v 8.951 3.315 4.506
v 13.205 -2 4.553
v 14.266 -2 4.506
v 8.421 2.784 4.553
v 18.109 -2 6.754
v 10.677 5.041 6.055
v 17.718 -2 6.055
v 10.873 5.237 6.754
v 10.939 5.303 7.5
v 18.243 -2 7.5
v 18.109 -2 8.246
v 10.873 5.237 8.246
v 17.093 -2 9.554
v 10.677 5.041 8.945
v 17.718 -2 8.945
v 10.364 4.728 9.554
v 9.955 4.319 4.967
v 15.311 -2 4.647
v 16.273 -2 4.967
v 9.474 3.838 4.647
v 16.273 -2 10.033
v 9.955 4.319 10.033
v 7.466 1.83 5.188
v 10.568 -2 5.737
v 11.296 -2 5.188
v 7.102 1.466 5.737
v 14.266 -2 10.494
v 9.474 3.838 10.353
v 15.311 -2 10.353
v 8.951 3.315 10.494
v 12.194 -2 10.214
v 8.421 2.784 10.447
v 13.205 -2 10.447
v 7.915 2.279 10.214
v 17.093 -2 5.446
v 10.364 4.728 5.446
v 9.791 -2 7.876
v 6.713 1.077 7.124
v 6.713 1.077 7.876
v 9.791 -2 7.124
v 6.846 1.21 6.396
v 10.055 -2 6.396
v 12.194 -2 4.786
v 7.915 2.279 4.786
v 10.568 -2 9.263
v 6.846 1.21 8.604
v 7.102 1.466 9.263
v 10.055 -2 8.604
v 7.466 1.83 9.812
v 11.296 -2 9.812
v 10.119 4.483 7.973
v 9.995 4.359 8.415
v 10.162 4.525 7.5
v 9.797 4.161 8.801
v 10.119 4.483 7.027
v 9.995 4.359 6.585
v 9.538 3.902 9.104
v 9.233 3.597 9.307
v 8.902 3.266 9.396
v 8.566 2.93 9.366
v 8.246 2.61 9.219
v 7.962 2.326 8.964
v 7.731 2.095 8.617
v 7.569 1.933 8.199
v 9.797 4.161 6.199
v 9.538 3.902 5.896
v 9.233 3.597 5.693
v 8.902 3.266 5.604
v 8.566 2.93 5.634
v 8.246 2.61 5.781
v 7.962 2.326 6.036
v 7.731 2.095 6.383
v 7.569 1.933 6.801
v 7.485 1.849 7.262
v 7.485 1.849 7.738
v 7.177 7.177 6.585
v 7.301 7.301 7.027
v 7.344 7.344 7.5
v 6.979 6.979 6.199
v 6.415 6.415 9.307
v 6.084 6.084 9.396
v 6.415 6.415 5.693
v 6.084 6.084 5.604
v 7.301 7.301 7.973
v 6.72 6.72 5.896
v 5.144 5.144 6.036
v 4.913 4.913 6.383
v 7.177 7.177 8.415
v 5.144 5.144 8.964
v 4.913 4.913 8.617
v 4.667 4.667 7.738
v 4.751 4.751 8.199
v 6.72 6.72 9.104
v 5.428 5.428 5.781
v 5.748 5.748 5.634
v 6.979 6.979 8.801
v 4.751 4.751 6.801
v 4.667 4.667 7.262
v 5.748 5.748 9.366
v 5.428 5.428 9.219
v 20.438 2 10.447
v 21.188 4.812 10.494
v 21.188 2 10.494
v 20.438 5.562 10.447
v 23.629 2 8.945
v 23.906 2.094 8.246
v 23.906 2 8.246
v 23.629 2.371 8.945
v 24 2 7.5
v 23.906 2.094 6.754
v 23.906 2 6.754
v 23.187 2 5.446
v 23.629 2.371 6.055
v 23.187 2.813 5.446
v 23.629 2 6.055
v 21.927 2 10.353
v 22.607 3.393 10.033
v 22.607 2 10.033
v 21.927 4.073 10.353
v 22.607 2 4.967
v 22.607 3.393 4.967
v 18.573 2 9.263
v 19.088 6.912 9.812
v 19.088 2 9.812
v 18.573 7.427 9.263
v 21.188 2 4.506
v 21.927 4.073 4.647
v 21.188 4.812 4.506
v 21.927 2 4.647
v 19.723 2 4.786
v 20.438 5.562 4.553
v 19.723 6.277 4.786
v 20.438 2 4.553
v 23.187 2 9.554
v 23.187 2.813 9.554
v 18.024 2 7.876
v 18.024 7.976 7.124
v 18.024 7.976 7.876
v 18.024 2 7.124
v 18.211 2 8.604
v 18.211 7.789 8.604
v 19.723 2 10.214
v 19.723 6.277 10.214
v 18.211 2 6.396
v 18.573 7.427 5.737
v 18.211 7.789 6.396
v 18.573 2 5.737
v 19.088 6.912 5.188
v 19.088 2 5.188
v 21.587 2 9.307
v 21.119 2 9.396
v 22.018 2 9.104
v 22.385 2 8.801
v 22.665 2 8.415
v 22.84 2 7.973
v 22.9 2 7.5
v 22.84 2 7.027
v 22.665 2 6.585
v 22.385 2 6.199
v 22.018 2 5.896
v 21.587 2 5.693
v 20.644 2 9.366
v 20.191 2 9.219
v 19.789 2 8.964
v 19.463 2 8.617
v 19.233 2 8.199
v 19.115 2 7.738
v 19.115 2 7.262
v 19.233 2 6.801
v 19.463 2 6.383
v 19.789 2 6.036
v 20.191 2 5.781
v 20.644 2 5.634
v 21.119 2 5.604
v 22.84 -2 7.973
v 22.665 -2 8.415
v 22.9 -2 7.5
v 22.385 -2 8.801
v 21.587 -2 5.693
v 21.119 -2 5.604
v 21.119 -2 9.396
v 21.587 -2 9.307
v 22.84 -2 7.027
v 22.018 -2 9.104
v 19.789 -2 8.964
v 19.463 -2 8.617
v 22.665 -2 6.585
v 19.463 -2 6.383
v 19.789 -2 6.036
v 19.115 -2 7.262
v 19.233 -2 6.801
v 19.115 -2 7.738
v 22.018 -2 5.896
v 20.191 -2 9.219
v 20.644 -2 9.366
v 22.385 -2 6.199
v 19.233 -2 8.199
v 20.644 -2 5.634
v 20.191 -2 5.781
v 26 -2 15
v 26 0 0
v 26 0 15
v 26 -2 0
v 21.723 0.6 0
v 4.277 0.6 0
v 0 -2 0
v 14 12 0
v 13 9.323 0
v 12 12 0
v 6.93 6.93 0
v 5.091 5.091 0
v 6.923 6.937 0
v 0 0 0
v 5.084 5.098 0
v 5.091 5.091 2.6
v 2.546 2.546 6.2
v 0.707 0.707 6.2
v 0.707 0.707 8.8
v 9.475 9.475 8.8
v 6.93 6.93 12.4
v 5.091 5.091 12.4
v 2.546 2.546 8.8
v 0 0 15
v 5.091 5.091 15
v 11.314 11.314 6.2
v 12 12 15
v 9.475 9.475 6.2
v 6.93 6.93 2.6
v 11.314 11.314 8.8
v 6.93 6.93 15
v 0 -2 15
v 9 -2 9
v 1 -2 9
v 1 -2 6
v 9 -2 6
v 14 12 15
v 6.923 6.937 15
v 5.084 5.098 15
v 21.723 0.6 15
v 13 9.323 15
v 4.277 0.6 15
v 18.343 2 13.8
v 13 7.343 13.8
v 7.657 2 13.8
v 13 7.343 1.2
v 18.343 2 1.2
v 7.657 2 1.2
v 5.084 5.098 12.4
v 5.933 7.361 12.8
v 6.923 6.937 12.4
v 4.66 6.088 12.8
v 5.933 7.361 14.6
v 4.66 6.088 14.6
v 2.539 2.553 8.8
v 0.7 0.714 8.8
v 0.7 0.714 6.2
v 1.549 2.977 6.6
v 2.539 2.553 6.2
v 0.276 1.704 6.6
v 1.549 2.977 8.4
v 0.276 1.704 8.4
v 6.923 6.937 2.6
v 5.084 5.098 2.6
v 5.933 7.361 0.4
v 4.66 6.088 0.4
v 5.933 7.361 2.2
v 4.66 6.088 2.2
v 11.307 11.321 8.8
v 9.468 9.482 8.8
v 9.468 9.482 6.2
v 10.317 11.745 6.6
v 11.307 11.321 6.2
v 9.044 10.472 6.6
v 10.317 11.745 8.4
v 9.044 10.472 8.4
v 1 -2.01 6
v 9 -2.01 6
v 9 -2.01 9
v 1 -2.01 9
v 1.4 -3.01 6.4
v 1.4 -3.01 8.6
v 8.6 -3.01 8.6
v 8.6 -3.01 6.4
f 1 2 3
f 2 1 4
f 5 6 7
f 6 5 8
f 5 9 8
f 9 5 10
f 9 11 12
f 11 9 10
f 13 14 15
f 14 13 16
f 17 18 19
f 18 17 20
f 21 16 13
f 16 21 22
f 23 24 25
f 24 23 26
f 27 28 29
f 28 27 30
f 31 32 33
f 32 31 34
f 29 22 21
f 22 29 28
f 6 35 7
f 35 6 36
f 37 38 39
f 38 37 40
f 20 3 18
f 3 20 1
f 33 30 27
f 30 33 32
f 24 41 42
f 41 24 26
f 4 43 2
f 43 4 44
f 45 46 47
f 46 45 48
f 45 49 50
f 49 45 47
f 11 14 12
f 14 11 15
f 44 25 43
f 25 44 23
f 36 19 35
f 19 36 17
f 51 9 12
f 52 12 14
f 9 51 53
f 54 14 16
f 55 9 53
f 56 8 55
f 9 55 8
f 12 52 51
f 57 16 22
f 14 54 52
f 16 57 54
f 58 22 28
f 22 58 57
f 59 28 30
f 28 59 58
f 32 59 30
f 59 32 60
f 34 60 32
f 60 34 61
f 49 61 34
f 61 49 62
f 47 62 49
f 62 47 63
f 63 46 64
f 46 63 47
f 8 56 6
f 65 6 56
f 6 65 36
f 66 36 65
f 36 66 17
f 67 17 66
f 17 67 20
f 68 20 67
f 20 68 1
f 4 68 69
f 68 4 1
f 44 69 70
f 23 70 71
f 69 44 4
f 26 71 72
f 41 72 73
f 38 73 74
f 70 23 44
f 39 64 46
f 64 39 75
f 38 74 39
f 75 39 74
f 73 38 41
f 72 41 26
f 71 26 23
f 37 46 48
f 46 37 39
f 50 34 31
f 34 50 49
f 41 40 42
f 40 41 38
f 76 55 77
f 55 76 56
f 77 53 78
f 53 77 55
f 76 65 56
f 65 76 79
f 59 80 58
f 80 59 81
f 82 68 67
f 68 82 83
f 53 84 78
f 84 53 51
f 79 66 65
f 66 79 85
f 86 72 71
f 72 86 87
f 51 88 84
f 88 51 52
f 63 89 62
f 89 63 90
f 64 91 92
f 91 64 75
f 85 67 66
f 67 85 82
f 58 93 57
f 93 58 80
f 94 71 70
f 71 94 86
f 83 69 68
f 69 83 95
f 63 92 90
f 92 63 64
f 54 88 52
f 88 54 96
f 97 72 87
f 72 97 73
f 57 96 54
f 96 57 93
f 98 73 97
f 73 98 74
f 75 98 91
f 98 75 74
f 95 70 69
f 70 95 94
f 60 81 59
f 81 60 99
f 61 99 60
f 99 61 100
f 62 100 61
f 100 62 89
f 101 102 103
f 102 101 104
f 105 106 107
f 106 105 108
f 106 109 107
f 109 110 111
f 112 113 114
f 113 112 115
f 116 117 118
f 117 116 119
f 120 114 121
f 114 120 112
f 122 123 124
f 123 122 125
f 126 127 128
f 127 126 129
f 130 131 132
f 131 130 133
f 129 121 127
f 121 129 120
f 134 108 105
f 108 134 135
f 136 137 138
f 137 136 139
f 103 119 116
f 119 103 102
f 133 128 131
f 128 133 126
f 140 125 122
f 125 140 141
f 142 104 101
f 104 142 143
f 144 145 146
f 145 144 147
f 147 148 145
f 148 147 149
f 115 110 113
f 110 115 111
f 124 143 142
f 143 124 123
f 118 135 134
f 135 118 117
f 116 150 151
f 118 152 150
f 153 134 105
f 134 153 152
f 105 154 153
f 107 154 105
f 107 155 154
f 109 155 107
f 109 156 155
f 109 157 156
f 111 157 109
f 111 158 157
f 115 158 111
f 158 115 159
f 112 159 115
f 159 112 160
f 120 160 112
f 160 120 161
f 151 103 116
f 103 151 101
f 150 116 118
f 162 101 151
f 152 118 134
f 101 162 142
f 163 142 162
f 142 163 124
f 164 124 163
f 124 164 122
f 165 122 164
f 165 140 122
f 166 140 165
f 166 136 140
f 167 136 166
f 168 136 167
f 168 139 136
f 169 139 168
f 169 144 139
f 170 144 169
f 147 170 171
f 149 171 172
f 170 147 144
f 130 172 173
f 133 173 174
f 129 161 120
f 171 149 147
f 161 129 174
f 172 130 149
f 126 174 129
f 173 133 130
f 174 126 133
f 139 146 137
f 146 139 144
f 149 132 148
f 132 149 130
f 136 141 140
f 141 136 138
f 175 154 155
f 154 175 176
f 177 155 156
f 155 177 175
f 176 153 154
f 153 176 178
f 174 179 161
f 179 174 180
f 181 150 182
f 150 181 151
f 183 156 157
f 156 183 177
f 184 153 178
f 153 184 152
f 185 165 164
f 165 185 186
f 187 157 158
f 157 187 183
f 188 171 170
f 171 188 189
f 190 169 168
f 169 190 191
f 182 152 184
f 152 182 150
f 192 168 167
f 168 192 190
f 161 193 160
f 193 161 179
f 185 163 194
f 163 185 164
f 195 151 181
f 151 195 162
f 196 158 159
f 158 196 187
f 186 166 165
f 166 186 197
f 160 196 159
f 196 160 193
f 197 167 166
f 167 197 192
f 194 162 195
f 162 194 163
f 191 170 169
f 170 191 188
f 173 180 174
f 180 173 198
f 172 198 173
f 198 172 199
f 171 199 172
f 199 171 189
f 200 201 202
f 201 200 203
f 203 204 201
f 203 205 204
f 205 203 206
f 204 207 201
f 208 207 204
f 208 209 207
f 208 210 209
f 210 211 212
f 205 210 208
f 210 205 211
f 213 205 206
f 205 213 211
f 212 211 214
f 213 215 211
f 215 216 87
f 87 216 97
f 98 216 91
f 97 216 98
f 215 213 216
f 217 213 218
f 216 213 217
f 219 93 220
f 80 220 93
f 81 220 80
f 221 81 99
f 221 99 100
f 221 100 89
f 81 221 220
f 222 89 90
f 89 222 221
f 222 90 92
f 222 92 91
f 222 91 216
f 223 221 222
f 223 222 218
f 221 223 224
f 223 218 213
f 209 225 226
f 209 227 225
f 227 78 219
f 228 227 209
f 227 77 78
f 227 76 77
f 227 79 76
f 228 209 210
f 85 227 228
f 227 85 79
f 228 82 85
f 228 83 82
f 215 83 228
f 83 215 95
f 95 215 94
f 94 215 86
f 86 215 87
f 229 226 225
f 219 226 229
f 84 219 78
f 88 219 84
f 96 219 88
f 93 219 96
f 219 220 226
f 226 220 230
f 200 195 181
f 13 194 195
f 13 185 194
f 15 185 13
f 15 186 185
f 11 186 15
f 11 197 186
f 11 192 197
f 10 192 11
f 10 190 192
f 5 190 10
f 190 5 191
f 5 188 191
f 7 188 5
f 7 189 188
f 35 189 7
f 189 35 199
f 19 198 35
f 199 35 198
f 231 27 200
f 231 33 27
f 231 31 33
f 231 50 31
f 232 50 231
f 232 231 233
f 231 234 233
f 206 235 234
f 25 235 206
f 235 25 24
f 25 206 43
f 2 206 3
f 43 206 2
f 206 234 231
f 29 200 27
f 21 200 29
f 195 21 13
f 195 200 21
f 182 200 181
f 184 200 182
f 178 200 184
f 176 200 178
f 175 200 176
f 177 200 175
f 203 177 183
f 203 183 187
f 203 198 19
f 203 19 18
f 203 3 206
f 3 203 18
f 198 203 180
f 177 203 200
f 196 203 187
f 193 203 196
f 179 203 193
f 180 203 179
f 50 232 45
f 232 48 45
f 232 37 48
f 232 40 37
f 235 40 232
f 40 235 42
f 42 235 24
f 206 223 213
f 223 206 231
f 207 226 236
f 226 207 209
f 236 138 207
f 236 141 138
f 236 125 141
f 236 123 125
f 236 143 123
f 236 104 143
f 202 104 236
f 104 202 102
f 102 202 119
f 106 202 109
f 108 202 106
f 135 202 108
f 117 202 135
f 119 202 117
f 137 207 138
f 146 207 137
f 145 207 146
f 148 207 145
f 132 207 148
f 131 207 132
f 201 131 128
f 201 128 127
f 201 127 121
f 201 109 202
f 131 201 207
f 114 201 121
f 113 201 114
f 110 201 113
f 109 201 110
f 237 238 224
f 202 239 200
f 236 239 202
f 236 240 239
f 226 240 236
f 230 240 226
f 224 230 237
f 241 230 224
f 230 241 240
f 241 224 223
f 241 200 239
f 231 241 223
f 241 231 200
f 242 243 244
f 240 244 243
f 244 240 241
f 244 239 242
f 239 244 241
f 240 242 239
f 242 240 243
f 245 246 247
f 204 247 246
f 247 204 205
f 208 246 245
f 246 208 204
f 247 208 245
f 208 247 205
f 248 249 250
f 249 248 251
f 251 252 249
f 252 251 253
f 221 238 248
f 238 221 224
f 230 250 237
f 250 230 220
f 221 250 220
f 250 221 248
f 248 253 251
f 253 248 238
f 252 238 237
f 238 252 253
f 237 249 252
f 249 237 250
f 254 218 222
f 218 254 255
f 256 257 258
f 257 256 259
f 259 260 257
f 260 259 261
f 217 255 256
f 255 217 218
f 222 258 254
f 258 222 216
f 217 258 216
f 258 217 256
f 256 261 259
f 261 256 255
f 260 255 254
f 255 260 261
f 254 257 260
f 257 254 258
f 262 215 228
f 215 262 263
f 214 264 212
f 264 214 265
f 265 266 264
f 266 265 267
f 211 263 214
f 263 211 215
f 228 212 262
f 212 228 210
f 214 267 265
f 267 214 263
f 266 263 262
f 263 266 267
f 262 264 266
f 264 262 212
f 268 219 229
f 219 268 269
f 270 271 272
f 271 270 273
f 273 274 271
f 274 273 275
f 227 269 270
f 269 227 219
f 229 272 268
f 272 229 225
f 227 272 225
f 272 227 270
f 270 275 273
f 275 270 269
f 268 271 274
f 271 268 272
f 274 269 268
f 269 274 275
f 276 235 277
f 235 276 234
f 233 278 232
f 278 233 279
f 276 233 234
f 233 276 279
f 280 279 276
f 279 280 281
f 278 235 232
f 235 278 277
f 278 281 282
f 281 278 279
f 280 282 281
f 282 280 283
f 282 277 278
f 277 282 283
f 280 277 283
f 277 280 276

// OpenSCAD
// file: ../cubes/cubes.scad
module beveledCube(size,bevel,height) {
    hull() {
        translate([0,0,height])
            linear_extrude(0.01)
                offset(delta=bevel*-1)
                    square(size, center=true);
        
        
        linear_extrude(0.01)
            square(size, center=true);
    }
}
// file: ../m3/m3.scad
module m3x5x4_ThreadedInsert() {
    cylinder(h=5,d=4.8,$fn=25);
}

module m3FHCS_counterSink() {
    cylinder(h=1.6, d1=3.8*2, d2=3.8, $fn=25);
}

module m3FHCS_counterSinkCutout(height=5) {
    union() {
        cylinder(h=1.6, d1=3.8*2, d2=3.8, $fn=25);
        cylinder(h=height+1.6, d=3.8, $fn=25);
    }
}

module m3BHCS_counterSinkCutout(height=5, countsinkHeight=1.6) {
    union() {
        cylinder(countsinkHeight, d=6, $fn=25);
        cylinder(h=height, d=3.8, $fn=25);
    }
}

module m3_mountingHole() {
    hull() {
        translate([-1.5,0])
            circle(d=3.8, $fn=25);
        translate([1.5,0]) 
            circle(d=3.8, $fn=25);
    }
}

module m3_mountingHoleColumn(holeInset, holeCountPerColumn, holeSpacing) {
    union () {
        translate([0,holeInset,0]) {
            for (i = [0:1:holeCountPerColumn-1]) {
                translate([0,i*holeSpacing]) 
                    m3_mountingHole();
            }
        }
    }
}
// file: frameBracket.scad
include <../m3/m3.scad>
include <../cubes/cubes.scad>

module frameBracket_outline() {
    polygon([
        [0,0],
        [12,12],
        [14,12],
        [26,0],
        [26,-2],
        [0,-2]
    ]);
}

module frameBracket_emboss() {
    hull() {
        translate([0,0,1.2])
            linear_extrude(0.1)
                offset(delta=-2.6)
                    frameBracket_outline();
        
        linear_extrude(0.1)
            offset(delta=-4)
                frameBracket_outline();
    }
}

module frameBracket(embossTop=true, embossBottom=true) {
    union() {
        difference() {
            linear_extrude(15)
                frameBracket_outline();
                
            translate([12,0,15/2])
                rotate([-90,0,45])
                    translate([0,0,-10+2])
            m3BHCS_counterSinkCutout(16.5, 16.5-4);
            

            translate([21,11,15/2])
                rotate([90,0,0])
                    m3BHCS_counterSinkCutout(14, 9);
            
            if (embossTop) {
                translate([0,0,15-1.2])
                    frameBracket_emboss();
            }
            
            if (embossBottom) {
                translate([0,0,1.2])
                    mirror([0,0,1])
                        frameBracket_emboss();
            }
        }
        
        rotate([0,0,45])
            translate([15/2+1,0,15/2]) {
                translate([0,0,15/2-2.6/2])
                    rotate([-90,0,0])
                        beveledCube([2.6,2.6],0.4,1);
                    
                translate([-15/2+2.6/2,0,0])
                    rotate([-90,0,0])
                        beveledCube([2.6,2.6],0.4,1);
                    
                translate([0,0,-15/2+2.6/2])
                    rotate([-90,0,0])
                        beveledCube([2.6,2.6],0.4,1);
                    
                translate([15/2-2.6/2,0,0])
                    rotate([-90,0,0])
                        beveledCube([2.6,2.6],0.4,1);
            }
            
        translate([8/2+1,-2,15/2])
            rotate([90,0,0])
                beveledCube([8,3],0.4,1);
    }
}

module frameBracket_magnetPocket(h=3.2, d=6.2) {
    union() {
        translate([d/2,d/2+d/10,0])
        cylinder(h=h,d=d, $fn=25);
        
        cube([d, d/2+d/10, h]);
    }
}

module frameBracket_withMagnets(h=3.2, d=6.2) {
    difference() {
        frameBracket(embossBottom=false);

        translate([14,-2,0.6])
            frameBracket_magnetPocket(h=h,d=d);
        
        translate([6,-2,0.6])
            frameBracket_magnetPocket(h=h,d=d);
    }
}

module frameBracket_50mmCuttingGuide() {
    union() {
        rotate([0,0,90])
            translate([15/2+3,-50,15/2+3]) {
                translate([0,0,15/2-2.6/2])
                    rotate([-90,0,0])
                        beveledCube([2.6,2.6],0.4,1);
                    
                translate([-15/2+2.6/2,0,0])
                    rotate([-90,0,0])
                        beveledCube([2.6,2.6],0.4,1);
                    
                translate([0,0,-15/2+2.6/2])
                    rotate([-90,0,0])
                        beveledCube([2.6,2.6],0.4,1);
                    
                translate([15/2-2.6/2,0,0])
                    rotate([-90,0,0])
                        beveledCube([2.6,2.6],0.4,1);
            }


        difference() {
            cube([53,18,18]);
            translate([0,2.6,2.6]) cube([50,15.4,15.4]);
        }
    }
}
// main file
include <frameBracket.scad>

Select = 0; //[0:noMagnets, 1:withMagnets, 2:50mmCuttingGuide]

magnetHeight=3.2;
magnetDiameter=6.2;
embossTop=true;
embossBottom=true;

if (Select == 0) {
    frameBracket(embossTop, embossBottom);
} else if (Select == 1) {
    frameBracket_withMagnets(magnetHeight, magnetDiameter);
} else if (Select == 2) {
    frameBracket_50mmCuttingGuide();
}
